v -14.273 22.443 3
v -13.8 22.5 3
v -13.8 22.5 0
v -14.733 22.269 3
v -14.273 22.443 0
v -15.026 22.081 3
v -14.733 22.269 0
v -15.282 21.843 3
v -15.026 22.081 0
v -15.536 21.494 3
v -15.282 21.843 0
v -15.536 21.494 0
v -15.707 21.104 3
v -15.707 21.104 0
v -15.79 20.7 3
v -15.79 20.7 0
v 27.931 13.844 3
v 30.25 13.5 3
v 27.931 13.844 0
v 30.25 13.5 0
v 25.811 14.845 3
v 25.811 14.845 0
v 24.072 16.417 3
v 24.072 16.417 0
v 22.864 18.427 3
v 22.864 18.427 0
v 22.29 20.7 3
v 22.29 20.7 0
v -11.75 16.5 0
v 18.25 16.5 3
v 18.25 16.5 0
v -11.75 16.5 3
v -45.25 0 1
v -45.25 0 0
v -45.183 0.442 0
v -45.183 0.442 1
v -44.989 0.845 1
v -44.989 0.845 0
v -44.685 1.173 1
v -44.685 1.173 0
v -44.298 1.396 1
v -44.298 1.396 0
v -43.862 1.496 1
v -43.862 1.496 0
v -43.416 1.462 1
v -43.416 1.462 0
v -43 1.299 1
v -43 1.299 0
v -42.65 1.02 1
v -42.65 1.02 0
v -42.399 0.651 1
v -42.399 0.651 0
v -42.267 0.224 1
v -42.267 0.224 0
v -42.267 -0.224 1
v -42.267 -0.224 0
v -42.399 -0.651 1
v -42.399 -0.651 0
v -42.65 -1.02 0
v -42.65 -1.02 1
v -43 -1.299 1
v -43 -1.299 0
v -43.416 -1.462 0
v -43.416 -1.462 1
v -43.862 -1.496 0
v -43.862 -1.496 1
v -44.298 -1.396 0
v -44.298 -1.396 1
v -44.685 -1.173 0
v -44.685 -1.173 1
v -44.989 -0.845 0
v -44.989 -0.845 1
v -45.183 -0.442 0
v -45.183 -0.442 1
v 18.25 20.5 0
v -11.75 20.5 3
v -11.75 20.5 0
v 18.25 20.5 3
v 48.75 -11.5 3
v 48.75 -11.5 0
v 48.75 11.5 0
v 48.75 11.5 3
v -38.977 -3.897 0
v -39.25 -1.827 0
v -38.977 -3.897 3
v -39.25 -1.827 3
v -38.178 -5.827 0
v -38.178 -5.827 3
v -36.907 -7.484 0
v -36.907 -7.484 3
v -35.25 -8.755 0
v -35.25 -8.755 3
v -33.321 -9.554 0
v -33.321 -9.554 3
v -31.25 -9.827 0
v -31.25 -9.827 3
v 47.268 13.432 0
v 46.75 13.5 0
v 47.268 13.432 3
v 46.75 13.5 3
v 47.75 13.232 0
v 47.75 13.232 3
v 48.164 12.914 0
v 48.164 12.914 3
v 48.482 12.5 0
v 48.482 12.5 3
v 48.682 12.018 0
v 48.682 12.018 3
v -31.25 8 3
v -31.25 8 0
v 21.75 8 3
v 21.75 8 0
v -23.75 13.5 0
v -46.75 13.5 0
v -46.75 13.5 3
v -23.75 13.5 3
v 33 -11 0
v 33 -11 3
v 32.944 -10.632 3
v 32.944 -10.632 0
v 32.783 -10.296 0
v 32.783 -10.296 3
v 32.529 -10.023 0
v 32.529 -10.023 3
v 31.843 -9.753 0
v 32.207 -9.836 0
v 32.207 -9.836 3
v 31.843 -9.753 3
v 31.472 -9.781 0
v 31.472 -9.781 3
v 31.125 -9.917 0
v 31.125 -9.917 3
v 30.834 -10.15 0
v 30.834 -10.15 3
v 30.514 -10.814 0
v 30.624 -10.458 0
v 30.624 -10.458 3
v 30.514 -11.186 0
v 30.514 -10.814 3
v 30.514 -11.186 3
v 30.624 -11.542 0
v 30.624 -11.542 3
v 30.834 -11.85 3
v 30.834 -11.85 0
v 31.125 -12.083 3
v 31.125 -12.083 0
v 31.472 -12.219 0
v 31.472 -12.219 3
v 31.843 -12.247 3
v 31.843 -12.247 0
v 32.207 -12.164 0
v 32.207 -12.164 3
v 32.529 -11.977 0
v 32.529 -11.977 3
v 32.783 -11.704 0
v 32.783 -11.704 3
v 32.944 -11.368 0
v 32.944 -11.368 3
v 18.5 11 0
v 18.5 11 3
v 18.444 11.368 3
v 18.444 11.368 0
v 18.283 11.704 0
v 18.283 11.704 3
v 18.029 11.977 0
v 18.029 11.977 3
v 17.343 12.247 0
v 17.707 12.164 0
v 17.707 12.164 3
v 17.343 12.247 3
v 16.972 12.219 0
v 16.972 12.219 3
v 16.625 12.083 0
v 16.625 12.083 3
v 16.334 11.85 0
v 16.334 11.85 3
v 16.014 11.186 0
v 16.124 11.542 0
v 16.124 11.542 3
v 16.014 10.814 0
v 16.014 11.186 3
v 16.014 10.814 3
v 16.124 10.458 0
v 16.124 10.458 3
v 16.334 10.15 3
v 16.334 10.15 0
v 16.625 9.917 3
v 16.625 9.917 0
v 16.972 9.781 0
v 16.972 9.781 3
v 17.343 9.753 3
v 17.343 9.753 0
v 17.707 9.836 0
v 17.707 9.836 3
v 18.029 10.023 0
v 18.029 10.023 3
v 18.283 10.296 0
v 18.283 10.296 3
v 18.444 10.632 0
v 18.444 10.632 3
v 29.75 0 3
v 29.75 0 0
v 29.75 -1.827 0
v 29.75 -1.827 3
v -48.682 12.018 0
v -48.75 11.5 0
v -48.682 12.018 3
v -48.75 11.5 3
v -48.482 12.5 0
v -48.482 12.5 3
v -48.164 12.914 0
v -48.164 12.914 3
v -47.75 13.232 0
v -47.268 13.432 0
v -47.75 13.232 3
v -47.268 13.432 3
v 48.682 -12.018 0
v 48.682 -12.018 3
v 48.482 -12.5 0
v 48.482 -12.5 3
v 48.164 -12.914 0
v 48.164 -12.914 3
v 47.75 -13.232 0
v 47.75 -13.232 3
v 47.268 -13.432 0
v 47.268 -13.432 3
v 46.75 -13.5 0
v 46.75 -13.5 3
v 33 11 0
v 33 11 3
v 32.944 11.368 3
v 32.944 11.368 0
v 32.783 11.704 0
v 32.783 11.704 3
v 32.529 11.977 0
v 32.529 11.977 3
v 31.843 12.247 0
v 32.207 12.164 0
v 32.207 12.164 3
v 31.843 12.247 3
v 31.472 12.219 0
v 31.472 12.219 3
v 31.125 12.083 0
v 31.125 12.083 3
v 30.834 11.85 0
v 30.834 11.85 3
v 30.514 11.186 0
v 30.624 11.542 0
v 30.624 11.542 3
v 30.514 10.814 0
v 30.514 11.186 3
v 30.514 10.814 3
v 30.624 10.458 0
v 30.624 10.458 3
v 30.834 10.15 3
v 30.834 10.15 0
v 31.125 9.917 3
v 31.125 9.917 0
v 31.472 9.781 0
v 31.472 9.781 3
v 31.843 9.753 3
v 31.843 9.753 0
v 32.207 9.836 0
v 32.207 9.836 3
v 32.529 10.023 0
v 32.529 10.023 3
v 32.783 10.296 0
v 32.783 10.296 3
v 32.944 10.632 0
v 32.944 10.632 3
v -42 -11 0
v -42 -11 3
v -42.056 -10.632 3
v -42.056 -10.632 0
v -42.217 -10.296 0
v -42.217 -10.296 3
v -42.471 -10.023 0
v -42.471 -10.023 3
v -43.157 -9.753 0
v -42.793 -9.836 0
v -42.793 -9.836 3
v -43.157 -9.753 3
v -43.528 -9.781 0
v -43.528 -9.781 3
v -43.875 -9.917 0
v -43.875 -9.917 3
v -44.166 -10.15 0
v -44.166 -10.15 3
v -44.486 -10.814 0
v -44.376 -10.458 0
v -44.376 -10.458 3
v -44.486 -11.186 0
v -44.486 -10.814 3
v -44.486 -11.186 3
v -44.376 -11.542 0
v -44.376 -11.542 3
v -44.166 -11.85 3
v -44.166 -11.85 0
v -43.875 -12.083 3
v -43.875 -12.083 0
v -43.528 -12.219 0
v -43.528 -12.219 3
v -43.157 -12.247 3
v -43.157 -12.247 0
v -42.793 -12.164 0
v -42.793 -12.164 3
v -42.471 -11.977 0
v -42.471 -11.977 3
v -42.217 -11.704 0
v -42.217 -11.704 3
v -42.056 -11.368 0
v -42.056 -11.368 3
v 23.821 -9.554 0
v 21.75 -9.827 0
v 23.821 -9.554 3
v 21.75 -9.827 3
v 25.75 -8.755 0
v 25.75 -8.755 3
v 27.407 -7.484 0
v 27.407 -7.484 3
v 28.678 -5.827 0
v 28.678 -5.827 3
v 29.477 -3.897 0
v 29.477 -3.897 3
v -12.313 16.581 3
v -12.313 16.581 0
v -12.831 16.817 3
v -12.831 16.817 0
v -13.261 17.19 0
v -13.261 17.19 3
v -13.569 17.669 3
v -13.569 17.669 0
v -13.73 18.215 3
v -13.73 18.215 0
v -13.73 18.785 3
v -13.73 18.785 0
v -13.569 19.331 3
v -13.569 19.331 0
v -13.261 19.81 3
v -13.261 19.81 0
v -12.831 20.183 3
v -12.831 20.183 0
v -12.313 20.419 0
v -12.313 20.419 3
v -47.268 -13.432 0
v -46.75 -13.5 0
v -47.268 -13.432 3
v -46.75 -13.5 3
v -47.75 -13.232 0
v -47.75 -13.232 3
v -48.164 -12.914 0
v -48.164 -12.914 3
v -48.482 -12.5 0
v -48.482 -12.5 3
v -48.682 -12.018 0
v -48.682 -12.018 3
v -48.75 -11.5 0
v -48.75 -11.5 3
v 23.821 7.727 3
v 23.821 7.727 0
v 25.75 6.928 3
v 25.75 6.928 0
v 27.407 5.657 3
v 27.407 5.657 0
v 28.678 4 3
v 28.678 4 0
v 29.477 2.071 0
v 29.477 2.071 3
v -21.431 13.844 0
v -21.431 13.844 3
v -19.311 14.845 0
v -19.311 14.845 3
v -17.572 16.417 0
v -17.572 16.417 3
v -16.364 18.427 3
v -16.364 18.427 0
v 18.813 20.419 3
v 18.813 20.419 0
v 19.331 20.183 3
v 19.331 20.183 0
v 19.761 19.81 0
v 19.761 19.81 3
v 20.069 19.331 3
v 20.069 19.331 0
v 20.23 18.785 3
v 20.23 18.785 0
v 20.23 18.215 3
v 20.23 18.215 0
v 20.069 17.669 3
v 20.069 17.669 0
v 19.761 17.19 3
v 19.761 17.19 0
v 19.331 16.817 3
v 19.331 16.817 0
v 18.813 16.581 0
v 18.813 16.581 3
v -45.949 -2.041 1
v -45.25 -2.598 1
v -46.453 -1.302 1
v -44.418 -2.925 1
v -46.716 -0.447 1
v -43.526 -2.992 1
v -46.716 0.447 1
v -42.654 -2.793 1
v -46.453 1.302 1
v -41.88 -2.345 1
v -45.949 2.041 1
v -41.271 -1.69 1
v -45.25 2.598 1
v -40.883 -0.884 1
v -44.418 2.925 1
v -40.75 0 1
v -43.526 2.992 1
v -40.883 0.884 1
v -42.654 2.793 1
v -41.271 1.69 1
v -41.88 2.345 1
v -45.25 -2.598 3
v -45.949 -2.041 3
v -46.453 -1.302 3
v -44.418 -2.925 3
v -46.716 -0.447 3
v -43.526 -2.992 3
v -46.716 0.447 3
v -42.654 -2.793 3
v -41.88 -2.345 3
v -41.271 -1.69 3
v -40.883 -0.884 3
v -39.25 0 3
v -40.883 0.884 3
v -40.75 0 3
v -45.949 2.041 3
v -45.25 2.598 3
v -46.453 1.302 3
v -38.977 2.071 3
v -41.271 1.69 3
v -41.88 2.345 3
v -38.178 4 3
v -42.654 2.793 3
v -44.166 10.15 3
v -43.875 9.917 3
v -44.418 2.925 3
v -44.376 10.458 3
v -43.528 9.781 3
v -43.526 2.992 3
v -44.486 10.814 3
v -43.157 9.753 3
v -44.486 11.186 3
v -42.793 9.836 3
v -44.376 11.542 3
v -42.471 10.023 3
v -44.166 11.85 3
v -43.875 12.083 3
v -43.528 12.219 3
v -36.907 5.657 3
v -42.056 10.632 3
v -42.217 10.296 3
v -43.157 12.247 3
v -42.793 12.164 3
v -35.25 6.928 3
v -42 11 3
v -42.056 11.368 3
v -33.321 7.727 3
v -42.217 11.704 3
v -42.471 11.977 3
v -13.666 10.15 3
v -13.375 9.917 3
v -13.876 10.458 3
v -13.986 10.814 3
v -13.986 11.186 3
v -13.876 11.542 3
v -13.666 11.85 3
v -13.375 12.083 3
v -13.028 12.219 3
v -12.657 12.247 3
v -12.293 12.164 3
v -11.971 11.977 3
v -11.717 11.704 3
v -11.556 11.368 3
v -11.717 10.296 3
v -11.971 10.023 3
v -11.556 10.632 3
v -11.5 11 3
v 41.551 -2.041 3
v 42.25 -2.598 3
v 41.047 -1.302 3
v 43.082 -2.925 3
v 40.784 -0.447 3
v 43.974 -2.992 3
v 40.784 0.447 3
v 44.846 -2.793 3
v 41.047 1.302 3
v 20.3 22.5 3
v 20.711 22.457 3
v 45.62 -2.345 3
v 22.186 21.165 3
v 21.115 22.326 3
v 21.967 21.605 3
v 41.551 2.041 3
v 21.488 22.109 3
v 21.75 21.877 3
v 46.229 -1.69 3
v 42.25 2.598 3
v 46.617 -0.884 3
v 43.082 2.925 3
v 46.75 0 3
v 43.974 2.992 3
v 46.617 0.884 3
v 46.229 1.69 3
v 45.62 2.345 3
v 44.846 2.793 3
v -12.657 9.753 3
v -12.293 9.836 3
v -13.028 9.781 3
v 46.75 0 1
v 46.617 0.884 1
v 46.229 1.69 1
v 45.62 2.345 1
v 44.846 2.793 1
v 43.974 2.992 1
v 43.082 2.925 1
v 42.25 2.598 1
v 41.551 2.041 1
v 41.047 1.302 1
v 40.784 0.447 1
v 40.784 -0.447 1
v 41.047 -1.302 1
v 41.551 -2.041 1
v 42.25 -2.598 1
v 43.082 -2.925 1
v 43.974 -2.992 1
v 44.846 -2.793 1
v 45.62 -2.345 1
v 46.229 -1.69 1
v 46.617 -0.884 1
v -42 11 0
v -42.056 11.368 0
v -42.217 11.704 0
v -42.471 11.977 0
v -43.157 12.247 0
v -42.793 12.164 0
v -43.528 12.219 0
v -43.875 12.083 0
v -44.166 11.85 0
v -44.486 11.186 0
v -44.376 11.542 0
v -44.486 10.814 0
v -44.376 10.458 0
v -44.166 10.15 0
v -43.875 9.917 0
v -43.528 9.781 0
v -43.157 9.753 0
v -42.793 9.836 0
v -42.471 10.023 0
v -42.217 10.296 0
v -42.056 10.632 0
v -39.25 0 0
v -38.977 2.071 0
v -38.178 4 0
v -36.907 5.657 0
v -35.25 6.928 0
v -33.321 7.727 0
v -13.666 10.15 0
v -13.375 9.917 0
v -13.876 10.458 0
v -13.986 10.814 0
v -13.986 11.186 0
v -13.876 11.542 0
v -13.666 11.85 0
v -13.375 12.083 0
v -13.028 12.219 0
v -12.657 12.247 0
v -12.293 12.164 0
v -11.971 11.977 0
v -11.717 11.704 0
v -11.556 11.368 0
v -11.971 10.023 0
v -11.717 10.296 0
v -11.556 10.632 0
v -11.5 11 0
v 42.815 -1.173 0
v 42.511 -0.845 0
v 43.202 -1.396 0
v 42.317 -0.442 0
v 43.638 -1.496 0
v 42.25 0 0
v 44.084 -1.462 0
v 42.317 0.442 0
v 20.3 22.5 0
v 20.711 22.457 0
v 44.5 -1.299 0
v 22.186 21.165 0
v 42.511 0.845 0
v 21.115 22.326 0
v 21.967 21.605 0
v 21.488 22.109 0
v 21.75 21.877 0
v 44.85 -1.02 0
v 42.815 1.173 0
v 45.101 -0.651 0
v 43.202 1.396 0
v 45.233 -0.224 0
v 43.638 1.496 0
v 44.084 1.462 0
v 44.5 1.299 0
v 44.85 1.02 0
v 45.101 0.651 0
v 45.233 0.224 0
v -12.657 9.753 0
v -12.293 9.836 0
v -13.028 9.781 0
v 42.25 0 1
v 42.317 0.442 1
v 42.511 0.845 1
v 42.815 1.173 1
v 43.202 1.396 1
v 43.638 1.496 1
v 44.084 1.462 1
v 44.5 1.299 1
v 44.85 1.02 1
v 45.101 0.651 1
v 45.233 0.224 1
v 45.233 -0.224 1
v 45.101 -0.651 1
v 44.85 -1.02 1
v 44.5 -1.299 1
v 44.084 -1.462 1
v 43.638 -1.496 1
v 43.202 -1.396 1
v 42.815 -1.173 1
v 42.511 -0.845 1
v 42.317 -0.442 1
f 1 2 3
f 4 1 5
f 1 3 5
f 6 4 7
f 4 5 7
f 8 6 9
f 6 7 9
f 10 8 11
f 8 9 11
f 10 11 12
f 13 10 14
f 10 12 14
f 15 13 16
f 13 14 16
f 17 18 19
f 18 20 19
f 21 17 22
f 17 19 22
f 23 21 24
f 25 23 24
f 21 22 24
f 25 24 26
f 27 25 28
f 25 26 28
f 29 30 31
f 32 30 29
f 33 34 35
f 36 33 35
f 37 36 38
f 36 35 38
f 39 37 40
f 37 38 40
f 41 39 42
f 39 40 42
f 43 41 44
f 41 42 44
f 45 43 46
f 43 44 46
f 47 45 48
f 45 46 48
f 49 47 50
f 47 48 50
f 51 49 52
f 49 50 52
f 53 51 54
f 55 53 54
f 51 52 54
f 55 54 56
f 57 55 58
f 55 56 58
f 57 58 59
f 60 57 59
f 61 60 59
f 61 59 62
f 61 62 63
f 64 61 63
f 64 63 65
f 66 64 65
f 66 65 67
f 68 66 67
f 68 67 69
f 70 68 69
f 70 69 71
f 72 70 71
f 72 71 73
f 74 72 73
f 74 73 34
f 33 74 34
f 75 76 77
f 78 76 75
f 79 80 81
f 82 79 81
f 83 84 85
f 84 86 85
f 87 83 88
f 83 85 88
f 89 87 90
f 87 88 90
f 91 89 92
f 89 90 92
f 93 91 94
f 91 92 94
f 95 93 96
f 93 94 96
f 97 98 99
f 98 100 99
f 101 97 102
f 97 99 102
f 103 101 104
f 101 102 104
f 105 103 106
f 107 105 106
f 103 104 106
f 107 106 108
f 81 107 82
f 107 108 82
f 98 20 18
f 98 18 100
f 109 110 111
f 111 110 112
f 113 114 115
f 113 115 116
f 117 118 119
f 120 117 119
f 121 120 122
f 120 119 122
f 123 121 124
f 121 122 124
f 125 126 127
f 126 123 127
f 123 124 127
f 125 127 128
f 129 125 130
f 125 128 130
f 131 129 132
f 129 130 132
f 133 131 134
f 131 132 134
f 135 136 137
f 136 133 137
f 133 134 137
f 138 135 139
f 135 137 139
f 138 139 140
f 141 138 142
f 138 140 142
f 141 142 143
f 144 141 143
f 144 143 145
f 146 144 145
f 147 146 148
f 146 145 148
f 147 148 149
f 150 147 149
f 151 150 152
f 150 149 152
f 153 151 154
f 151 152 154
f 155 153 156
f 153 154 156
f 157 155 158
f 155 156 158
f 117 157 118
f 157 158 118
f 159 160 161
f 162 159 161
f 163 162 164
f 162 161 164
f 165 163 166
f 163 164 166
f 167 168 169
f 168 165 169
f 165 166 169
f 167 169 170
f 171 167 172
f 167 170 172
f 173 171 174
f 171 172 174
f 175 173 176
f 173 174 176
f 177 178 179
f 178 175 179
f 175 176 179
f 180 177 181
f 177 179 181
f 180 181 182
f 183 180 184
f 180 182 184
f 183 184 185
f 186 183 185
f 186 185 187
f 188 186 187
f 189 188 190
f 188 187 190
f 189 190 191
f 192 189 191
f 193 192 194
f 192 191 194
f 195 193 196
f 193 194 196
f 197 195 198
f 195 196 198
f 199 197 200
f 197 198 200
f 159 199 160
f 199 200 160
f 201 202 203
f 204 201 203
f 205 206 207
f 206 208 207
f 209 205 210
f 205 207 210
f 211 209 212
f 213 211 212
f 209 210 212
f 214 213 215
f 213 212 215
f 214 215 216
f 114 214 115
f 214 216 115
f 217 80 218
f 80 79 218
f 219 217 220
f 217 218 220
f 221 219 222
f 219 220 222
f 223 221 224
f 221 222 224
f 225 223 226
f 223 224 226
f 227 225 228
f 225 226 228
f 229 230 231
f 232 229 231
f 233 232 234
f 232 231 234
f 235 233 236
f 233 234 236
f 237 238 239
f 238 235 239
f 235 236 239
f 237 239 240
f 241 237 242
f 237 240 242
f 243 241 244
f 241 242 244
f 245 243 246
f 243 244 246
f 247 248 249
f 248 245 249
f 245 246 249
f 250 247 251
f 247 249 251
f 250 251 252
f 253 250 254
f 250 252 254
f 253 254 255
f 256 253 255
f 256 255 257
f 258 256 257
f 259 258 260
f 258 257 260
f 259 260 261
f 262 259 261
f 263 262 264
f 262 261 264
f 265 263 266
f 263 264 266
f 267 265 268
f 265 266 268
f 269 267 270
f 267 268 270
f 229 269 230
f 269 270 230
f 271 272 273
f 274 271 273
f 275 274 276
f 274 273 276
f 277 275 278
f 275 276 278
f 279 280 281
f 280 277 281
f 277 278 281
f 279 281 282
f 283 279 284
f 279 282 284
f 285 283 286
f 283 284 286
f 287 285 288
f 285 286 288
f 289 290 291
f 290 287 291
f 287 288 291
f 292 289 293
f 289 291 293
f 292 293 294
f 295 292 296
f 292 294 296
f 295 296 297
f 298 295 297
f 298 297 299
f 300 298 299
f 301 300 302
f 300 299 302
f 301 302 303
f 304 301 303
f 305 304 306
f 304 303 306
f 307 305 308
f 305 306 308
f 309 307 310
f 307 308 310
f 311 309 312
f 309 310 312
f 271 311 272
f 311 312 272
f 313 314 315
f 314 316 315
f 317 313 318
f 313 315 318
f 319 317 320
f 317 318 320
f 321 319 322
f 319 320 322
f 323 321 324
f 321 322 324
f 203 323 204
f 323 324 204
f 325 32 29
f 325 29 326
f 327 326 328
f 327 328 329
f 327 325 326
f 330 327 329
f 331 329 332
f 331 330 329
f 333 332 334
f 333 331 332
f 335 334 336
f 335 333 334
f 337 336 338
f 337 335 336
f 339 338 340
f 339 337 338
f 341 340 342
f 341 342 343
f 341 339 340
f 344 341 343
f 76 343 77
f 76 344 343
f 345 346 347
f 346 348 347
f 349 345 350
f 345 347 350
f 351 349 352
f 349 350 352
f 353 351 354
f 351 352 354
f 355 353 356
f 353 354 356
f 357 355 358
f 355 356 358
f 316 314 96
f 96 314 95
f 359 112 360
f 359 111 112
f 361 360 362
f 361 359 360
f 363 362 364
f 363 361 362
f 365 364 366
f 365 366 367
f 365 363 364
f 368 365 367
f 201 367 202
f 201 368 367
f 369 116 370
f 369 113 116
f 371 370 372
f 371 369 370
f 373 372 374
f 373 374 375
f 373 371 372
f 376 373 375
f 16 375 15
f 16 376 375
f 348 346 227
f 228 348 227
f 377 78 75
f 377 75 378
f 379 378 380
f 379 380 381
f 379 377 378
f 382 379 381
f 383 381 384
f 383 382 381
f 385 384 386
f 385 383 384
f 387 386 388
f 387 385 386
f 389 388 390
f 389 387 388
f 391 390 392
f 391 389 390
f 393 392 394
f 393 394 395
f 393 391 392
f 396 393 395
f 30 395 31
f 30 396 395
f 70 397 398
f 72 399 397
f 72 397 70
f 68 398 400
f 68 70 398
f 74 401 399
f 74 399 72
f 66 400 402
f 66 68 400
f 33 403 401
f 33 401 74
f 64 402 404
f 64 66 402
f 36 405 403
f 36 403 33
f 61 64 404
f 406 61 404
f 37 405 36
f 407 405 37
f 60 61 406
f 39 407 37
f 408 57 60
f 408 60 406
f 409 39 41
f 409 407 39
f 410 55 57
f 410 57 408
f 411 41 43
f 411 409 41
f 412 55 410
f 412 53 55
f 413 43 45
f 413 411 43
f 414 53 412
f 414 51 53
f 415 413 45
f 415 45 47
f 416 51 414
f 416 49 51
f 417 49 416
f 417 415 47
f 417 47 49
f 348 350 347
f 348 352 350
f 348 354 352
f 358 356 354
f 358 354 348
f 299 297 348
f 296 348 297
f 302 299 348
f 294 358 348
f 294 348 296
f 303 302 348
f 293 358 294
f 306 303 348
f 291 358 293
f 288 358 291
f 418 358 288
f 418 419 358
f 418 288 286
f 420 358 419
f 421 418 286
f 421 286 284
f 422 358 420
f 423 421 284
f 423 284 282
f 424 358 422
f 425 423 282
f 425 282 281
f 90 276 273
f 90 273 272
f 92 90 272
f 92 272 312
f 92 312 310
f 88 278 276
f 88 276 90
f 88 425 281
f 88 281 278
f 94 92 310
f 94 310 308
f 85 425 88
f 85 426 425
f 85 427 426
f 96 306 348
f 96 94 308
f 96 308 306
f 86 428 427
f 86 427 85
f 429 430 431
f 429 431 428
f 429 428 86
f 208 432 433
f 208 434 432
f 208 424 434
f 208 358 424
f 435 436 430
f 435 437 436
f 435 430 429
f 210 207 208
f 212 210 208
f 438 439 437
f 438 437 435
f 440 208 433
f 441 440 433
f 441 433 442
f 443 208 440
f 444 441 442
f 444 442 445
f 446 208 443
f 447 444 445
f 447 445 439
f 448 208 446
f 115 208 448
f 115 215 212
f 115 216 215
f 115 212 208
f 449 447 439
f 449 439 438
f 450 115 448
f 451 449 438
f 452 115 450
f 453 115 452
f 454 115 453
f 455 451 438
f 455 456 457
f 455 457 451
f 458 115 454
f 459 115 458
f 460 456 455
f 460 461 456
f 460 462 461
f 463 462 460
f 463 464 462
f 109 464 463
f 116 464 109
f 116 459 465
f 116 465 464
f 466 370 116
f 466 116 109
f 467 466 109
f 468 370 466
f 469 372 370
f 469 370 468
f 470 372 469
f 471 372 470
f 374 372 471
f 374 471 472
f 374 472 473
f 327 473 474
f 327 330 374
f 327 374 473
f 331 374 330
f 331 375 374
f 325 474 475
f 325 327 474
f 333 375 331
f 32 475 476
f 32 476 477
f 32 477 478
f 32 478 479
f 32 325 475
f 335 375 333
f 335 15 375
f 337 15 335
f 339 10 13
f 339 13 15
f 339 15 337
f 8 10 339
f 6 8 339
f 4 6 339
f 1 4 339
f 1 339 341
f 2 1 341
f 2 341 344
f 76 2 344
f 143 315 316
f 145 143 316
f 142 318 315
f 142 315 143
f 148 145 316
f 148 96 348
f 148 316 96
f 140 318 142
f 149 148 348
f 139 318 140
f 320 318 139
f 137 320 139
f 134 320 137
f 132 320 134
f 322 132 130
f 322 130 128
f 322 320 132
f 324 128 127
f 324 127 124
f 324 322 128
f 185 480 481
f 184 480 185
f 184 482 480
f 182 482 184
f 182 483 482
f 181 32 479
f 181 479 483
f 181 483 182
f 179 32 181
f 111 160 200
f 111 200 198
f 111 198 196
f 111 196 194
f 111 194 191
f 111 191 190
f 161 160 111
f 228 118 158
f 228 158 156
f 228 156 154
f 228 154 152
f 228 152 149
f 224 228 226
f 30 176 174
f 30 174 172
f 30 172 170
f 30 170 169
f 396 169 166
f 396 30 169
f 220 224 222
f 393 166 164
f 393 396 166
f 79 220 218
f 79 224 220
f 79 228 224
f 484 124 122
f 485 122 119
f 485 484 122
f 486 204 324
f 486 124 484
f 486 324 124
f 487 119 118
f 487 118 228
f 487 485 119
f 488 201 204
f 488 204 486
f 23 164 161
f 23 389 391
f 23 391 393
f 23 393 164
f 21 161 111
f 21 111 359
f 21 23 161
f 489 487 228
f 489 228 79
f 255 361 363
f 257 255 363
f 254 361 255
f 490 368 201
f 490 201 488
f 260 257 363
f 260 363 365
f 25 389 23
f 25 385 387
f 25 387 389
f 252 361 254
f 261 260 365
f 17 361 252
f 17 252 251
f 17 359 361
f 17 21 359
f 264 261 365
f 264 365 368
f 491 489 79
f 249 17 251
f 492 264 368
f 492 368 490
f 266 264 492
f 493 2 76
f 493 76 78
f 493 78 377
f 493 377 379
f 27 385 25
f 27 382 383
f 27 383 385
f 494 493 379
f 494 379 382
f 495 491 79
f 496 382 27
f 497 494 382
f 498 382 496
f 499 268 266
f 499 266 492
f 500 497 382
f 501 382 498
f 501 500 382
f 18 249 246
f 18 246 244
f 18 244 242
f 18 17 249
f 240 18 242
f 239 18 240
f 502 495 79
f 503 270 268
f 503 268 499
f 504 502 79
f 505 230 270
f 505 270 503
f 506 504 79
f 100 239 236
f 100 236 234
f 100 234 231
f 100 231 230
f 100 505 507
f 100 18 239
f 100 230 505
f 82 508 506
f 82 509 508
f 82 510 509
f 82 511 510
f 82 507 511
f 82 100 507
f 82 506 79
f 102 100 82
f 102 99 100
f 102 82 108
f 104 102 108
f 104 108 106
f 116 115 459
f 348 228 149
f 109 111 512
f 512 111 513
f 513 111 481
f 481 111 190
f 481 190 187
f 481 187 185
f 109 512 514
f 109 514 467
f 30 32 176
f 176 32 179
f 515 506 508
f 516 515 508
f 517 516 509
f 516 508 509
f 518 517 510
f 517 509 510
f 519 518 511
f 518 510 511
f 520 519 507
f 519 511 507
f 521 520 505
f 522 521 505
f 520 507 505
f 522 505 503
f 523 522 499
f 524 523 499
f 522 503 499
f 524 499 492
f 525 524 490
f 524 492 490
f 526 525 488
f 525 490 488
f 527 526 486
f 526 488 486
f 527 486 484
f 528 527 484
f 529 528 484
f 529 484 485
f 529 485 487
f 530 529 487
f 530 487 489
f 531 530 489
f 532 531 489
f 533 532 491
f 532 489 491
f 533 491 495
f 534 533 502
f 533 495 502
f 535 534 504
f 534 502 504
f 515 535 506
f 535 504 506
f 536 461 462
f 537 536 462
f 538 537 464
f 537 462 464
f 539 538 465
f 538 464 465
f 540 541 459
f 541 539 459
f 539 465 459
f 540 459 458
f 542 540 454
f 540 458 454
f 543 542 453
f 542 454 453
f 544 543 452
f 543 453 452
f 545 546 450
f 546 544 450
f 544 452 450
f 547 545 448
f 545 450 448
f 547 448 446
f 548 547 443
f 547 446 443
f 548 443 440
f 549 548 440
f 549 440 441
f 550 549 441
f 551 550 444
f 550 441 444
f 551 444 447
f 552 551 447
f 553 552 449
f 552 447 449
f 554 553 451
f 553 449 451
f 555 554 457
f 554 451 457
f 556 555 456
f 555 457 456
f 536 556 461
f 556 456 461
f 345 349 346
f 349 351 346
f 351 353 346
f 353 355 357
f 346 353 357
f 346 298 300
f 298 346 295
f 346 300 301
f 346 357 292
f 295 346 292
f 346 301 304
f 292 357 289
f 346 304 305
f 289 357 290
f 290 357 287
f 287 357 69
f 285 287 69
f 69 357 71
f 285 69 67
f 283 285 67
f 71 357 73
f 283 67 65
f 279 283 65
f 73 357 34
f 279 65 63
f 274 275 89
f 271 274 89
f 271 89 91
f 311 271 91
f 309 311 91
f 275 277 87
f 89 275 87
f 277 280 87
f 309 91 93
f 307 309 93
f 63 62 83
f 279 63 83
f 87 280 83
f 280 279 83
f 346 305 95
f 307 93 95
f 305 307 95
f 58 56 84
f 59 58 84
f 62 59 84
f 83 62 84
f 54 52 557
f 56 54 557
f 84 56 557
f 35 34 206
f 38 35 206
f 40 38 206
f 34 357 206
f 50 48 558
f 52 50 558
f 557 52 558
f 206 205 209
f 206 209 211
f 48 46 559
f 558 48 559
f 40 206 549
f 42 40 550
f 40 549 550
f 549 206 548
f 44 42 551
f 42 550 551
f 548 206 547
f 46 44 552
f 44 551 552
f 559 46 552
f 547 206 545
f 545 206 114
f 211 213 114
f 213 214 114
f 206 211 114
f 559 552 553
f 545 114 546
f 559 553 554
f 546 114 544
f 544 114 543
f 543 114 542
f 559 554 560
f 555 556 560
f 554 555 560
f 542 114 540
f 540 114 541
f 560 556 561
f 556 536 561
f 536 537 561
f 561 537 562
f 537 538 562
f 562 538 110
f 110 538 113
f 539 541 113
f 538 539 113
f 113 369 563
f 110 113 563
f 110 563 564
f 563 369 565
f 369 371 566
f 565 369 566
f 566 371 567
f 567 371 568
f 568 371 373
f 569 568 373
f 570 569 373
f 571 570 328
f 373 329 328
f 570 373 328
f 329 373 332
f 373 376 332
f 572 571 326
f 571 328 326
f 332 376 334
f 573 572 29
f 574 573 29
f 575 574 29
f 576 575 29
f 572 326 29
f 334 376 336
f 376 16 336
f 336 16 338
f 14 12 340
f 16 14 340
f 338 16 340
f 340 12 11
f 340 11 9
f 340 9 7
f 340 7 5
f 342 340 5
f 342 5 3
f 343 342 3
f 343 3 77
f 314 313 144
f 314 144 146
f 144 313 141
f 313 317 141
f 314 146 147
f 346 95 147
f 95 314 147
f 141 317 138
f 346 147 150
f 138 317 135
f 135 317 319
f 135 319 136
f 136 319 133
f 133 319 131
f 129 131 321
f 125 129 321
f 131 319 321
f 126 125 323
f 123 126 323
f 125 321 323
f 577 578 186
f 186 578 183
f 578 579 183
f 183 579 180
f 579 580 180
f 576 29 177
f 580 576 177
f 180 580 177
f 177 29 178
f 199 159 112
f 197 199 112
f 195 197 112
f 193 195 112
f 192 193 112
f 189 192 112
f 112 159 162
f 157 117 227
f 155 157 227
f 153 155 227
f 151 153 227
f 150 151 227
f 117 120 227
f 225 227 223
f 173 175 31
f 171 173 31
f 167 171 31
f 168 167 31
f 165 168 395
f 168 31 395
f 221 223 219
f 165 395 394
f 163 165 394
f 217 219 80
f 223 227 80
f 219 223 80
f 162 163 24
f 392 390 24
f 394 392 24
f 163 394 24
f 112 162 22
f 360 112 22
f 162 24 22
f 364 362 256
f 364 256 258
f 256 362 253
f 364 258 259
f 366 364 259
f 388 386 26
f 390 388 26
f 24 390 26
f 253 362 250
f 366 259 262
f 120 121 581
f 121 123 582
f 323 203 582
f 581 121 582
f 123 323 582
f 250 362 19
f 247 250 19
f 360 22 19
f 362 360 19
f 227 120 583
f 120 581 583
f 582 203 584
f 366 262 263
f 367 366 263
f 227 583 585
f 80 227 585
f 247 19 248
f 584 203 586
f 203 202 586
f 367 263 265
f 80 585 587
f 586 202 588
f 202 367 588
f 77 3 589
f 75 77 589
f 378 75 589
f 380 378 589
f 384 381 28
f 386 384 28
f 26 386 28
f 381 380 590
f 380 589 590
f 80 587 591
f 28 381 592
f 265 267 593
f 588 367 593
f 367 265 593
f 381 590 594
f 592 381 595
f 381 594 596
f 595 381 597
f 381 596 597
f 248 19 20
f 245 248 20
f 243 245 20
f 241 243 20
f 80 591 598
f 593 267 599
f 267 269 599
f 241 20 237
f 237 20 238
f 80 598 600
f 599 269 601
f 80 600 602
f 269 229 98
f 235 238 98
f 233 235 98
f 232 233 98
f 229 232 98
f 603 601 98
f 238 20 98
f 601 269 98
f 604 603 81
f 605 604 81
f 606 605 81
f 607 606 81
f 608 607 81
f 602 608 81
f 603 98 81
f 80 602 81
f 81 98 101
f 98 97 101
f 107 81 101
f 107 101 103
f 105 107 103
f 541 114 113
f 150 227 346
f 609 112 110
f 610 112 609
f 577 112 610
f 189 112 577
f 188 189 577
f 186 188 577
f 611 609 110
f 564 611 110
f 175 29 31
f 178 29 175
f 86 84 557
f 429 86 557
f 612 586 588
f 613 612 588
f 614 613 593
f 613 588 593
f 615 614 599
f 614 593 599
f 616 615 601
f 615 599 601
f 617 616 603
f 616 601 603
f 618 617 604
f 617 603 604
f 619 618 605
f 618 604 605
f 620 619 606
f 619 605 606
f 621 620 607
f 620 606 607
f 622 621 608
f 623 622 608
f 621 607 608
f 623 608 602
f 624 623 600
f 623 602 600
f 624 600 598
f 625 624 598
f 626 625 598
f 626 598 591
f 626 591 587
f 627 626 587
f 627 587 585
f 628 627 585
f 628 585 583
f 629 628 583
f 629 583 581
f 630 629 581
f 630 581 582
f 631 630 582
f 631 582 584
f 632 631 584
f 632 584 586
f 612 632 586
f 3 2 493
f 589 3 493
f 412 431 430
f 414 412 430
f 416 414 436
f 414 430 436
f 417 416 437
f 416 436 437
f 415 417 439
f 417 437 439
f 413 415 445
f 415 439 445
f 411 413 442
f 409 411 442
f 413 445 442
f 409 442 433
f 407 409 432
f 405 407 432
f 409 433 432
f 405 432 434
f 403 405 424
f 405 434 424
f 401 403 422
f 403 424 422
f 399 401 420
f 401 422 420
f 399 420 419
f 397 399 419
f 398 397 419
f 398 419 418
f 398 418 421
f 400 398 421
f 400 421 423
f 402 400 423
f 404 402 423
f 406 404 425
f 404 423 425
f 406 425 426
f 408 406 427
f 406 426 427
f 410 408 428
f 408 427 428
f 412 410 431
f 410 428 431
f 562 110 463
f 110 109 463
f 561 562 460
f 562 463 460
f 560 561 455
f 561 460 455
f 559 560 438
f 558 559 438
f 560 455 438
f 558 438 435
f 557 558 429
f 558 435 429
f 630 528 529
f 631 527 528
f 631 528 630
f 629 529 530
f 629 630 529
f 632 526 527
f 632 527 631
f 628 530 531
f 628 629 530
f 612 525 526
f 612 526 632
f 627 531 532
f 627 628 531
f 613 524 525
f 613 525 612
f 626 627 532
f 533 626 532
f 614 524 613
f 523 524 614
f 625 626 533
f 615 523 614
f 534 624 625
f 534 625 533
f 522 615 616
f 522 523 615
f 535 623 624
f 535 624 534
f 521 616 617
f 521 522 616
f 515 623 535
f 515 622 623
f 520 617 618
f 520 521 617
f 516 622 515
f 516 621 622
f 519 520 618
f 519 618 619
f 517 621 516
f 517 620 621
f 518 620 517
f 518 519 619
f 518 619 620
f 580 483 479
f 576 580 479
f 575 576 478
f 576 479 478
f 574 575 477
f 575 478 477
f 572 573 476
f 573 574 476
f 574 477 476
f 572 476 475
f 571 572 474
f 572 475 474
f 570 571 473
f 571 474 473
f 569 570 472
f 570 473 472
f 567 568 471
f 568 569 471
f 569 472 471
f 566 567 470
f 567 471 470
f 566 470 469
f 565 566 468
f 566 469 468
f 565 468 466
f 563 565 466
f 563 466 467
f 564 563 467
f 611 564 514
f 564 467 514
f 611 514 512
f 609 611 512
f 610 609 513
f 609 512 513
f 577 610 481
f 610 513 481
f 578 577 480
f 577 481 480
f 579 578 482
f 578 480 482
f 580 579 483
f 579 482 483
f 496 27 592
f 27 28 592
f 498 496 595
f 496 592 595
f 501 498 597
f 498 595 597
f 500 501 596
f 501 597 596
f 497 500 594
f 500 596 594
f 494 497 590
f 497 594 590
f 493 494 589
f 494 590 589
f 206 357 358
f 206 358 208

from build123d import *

# Parameters (mm, degrees)
SKETCH_3_W               = 97.5
SKETCH_3_H               = 27
EXTRUDE_1_DEPTH          = 3
SKETCH_4_R               = 1.25
CUT_EXTRUDE_1_DEPTH      = 51.673587795
SKETCH_7_W               = 4
SKETCH_7_H               = 8
EXTRUDE_2_DEPTH          = 5
SKETCH_8_W               = 38
SKETCH_8_H               = 9
EXTRUDE_3_DEPTH          = 3
FILLET_3_R               = 8
FILLET_4_R               = 2
CUT_EXTRUDE_4_DEPTH      = 55.284551355
CUT_EXTRUDE_4_DEPTH_BACK = 5
SKETCH_9_W               = 4
SKETCH_9_H               = 8
SKETCH_13_R              = 1.5
CUT_EXTRUDE_7_DEPTH      = 54.775575449
SKETCH_16_R              = 3
CUT_EXTRUDE_9_DEPTH      = 2
CUT_EXTRUDE_10_DEPTH     = 10
FILLET_5_R               = 8
FILLET_6_R               = 2
HOLE_WIZARD_M3_1_D       = 2.5
HOLE_WIZARD_M3_1_DEPTH   = 3
HOLE_WIZARD_M3_1_TIP     = 0.751075774


with BuildPart() as part:
    # 草图3 → 凸台-拉伸1 (new body)
    with BuildSketch(Plane.XY):
        Rectangle(SKETCH_3_W, SKETCH_3_H)
    extrude(amount=EXTRUDE_1_DEPTH)

    # 草图4 → 切除-拉伸1 (cut, through all)
    with BuildSketch(Plane.XY.offset(3)):
        with Locations((-43.25, 11)):
            Circle(SKETCH_4_R)
        with Locations((-43.25, -11)):
            Circle(SKETCH_4_R)
        with Locations((31.75, 11)):
            Circle(SKETCH_4_R)
        with Locations((31.75, -11)):
            Circle(SKETCH_4_R)
        with Locations((17.25, 11)):
            Circle(SKETCH_4_R)
        with Locations((-12.75, 11)):
            Circle(SKETCH_4_R)
    extrude(amount=-CUT_EXTRUDE_1_DEPTH, mode=Mode.SUBTRACT)

    # 草图7 → 凸台-拉伸2 (add)
    with BuildSketch(Plane(origin=(0, 0, 0), x_dir=(-1, 0, 0), z_dir=(0, 0, -1))):
        with Locations((46.75, 0.5)):
            Rectangle(SKETCH_7_W, SKETCH_7_H)
        with Locations((-46.75, 0.5)):
            Rectangle(SKETCH_7_W, SKETCH_7_H)
    extrude(amount=EXTRUDE_2_DEPTH)

    # 草图8 → 凸台-拉伸3 (add)
    with BuildSketch(Plane.XY.offset(3)):
        with Locations((3.25, 18)):
            Rectangle(SKETCH_8_W, SKETCH_8_H)
        with BuildLine():
            Line((-11.75, 20.5), (18.25, 20.5))
            ThreePointArc((18.25, 20.5), (20.25, 18.5), (18.25, 16.5))
            Line((18.25, 16.5), (-11.75, 16.5))
            ThreePointArc((-11.75, 16.5), (-13.75, 18.5), (-11.75, 20.5))
        make_face(mode=Mode.SUBTRACT)
    extrude(amount=-EXTRUDE_3_DEPTH)

    # 圆角3
    fillet_3_edges = [part.edges().sort_by_distance(p)[0] for p in [
        (22.25, 13.5, 1.5),
        (-15.75, 13.5, 1.5),
    ]]
    fillet(fillet_3_edges, radius=FILLET_3_R)

    # 圆角4
    fillet_4_edges = [part.edges().sort_by_distance(p)[0] for p in [
        (-15.75, 22.5, 1.5),
        (22.25, 22.5, 1.5),
    ]]
    fillet(fillet_4_edges, radius=FILLET_4_R)

    # 草图9 → 切除-拉伸4 (cut, two sides: drawn at the far end of the back side and taken through both)
    with BuildSketch(Plane(origin=(0, 0, -5), x_dir=(-1, 0, 0), z_dir=(0, 0, -1)).offset(-CUT_EXTRUDE_4_DEPTH_BACK)):
        with Locations((-46.75, 0.5)):
            Rectangle(SKETCH_9_W, SKETCH_9_H)
        with Locations((46.75, 0.5)):
            Rectangle(SKETCH_9_W, SKETCH_9_H)
    extrude(amount=CUT_EXTRUDE_4_DEPTH + CUT_EXTRUDE_4_DEPTH_BACK, mode=Mode.SUBTRACT)

    # 草图13 → 切除-拉伸7 (cut, through all)
    with BuildSketch(Plane(origin=(0, 0, 0), x_dir=(-1, 0, 0), z_dir=(0, 0, -1))):
        with Locations((-43.75, 0)):
            Circle(SKETCH_13_R)
        with Locations((43.75, 0)):
            Circle(SKETCH_13_R)
    extrude(amount=-CUT_EXTRUDE_7_DEPTH, mode=Mode.SUBTRACT)

    # 草图16 → 切除-拉伸9 (cut)
    with BuildSketch(Plane.XY.offset(3)):
        with Locations((-43.75, 0)):
            Circle(SKETCH_16_R)
        with Locations((43.75, 0)):
            Circle(SKETCH_16_R)
    extrude(amount=-CUT_EXTRUDE_9_DEPTH, mode=Mode.SUBTRACT)

    # 草图17 → 切除-拉伸10 (cut)
    with BuildSketch(Plane(origin=(0, 0, 0), x_dir=(-1, 0, 0), z_dir=(0, 0, -1))):
        Polygon((39.25, -8), (39.25, 8), (-27.75, 8), (-29.75, 8), (-29.75, -9.826666667), (-27.75, -9.826666667), (39.25, -9.826666667), align=None)
    extrude(amount=-CUT_EXTRUDE_10_DEPTH, mode=Mode.SUBTRACT)

    # 圆角5
    fillet_5_edges = [part.edges().sort_by_distance(p)[0] for p in [
        (29.75, 8, 1.5),
        (-39.25, 8, 1.5),
        (-39.25, -9.826666667, 1.5),
        (29.75, -9.826666667, 1.5),
    ]]
    fillet(fillet_5_edges, radius=FILLET_5_R)

    # 圆角6
    fillet_6_edges = [part.edges().sort_by_distance(p)[0] for p in [
        (48.75, -13.5, 1.5),
        (-48.75, -13.5, 1.5),
        (-48.75, 13.5, 1.5),
        (48.75, 13.5, 1.5),
    ]]
    fillet(fillet_6_edges, radius=FILLET_6_R)

    # M3 螺纹孔1
    with Locations(Plane(origin=(-43.25, 11, 3), x_dir=(1, 0, 0), z_dir=(0, 0, 1))):
        with Locations((0, 0), (0, -22), (30.5, 0), (60.5, 0), (75, 0), (75, -22)):
            Hole(HOLE_WIZARD_M3_1_D / 2, depth=HOLE_WIZARD_M3_1_DEPTH)
            with Locations((0, 0, -(HOLE_WIZARD_M3_1_DEPTH + HOLE_WIZARD_M3_1_TIP / 2))):  # 118° drill point
                Cone(0, HOLE_WIZARD_M3_1_D / 2, HOLE_WIZARD_M3_1_TIP, mode=Mode.SUBTRACT)


solid = part.part
